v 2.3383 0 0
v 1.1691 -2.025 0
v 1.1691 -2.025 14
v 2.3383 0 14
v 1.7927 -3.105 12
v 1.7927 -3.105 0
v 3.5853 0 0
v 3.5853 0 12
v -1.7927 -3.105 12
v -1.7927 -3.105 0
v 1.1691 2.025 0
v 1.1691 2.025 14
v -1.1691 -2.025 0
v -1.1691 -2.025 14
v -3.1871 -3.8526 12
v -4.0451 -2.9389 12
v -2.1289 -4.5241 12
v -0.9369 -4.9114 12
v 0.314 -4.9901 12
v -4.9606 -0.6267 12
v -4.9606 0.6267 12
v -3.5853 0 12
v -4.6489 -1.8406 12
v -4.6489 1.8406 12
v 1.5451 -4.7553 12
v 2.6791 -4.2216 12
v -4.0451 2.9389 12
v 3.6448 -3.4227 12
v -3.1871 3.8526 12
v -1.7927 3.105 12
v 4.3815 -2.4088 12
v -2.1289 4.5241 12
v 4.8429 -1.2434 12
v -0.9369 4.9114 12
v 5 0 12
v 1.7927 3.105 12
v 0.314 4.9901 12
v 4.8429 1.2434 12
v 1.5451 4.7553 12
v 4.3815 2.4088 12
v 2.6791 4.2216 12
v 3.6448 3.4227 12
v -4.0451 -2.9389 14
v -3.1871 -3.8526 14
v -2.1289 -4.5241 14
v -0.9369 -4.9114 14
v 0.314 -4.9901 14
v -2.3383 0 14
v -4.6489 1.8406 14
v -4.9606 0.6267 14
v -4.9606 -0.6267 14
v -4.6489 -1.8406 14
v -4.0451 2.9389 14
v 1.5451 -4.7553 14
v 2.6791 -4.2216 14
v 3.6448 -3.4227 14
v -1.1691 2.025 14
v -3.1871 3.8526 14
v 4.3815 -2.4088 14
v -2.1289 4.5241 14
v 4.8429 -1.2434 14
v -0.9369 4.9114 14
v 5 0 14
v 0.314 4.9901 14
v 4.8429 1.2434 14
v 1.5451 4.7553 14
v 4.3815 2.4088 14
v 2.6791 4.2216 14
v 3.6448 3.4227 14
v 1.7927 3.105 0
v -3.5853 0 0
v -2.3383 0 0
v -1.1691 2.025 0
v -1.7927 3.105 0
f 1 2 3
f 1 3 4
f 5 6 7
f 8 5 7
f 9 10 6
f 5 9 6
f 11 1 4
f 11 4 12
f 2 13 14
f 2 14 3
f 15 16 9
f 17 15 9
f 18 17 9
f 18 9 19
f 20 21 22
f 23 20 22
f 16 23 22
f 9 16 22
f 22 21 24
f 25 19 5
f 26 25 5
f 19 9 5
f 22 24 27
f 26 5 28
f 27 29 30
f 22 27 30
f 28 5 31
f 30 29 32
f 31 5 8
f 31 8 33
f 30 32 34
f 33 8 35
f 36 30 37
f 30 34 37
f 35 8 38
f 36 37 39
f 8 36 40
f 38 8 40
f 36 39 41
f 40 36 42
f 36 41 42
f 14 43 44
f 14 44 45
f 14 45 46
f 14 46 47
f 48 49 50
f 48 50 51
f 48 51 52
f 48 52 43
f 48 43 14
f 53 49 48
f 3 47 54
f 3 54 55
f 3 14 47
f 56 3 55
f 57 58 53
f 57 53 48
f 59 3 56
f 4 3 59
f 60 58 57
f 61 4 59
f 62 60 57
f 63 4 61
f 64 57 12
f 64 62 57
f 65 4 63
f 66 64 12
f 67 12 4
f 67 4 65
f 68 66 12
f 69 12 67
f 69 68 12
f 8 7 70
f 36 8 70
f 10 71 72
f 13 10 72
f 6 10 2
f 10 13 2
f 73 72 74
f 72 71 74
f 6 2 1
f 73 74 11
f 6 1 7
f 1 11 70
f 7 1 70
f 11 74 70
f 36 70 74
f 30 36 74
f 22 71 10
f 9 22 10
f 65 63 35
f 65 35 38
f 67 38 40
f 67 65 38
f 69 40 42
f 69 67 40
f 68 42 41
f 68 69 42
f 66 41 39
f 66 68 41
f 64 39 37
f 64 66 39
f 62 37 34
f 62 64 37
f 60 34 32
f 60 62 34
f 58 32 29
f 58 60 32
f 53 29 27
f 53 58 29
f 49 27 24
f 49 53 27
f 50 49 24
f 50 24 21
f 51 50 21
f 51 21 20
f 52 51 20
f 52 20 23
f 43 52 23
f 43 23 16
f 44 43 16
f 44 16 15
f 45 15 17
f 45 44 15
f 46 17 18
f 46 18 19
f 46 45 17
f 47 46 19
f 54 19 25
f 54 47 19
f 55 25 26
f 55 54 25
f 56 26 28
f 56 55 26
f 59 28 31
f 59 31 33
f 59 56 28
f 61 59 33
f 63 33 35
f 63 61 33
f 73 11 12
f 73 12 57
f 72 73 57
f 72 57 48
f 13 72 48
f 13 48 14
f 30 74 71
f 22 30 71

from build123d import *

# Parameters (mm, degrees)
PAD_DEPTH     = 14
SKETCH001_R   = 5
SKETCH001_R_2 = 2.678441
PAD001_DEPTH  = 2


with BuildPart() as part:
    # Sketch → Pad (new body)
    with BuildSketch(Plane.XY):
        Polygon((3.585345, 0), (1.792673, 3.105), (-1.792673, 3.105), (-3.585345, 0), (-1.792673, -3.105), (1.792673, -3.105), align=None)
        Polygon((-2.338269, 0), (-1.169134, -2.025), (1.169134, -2.025), (2.338269, 0), (1.169134, 2.025), (-1.169134, 2.025), align=None, mode=Mode.SUBTRACT)
    extrude(amount=PAD_DEPTH)

    # Sketch001 (on Face14 of Pad) → Pad001 (join)
    with BuildSketch(Plane.XY.offset(14)):
        Circle(SKETCH001_R)
        Circle(SKETCH001_R_2, mode=Mode.SUBTRACT)
    extrude(amount=-PAD001_DEPTH)


solid = part.part
